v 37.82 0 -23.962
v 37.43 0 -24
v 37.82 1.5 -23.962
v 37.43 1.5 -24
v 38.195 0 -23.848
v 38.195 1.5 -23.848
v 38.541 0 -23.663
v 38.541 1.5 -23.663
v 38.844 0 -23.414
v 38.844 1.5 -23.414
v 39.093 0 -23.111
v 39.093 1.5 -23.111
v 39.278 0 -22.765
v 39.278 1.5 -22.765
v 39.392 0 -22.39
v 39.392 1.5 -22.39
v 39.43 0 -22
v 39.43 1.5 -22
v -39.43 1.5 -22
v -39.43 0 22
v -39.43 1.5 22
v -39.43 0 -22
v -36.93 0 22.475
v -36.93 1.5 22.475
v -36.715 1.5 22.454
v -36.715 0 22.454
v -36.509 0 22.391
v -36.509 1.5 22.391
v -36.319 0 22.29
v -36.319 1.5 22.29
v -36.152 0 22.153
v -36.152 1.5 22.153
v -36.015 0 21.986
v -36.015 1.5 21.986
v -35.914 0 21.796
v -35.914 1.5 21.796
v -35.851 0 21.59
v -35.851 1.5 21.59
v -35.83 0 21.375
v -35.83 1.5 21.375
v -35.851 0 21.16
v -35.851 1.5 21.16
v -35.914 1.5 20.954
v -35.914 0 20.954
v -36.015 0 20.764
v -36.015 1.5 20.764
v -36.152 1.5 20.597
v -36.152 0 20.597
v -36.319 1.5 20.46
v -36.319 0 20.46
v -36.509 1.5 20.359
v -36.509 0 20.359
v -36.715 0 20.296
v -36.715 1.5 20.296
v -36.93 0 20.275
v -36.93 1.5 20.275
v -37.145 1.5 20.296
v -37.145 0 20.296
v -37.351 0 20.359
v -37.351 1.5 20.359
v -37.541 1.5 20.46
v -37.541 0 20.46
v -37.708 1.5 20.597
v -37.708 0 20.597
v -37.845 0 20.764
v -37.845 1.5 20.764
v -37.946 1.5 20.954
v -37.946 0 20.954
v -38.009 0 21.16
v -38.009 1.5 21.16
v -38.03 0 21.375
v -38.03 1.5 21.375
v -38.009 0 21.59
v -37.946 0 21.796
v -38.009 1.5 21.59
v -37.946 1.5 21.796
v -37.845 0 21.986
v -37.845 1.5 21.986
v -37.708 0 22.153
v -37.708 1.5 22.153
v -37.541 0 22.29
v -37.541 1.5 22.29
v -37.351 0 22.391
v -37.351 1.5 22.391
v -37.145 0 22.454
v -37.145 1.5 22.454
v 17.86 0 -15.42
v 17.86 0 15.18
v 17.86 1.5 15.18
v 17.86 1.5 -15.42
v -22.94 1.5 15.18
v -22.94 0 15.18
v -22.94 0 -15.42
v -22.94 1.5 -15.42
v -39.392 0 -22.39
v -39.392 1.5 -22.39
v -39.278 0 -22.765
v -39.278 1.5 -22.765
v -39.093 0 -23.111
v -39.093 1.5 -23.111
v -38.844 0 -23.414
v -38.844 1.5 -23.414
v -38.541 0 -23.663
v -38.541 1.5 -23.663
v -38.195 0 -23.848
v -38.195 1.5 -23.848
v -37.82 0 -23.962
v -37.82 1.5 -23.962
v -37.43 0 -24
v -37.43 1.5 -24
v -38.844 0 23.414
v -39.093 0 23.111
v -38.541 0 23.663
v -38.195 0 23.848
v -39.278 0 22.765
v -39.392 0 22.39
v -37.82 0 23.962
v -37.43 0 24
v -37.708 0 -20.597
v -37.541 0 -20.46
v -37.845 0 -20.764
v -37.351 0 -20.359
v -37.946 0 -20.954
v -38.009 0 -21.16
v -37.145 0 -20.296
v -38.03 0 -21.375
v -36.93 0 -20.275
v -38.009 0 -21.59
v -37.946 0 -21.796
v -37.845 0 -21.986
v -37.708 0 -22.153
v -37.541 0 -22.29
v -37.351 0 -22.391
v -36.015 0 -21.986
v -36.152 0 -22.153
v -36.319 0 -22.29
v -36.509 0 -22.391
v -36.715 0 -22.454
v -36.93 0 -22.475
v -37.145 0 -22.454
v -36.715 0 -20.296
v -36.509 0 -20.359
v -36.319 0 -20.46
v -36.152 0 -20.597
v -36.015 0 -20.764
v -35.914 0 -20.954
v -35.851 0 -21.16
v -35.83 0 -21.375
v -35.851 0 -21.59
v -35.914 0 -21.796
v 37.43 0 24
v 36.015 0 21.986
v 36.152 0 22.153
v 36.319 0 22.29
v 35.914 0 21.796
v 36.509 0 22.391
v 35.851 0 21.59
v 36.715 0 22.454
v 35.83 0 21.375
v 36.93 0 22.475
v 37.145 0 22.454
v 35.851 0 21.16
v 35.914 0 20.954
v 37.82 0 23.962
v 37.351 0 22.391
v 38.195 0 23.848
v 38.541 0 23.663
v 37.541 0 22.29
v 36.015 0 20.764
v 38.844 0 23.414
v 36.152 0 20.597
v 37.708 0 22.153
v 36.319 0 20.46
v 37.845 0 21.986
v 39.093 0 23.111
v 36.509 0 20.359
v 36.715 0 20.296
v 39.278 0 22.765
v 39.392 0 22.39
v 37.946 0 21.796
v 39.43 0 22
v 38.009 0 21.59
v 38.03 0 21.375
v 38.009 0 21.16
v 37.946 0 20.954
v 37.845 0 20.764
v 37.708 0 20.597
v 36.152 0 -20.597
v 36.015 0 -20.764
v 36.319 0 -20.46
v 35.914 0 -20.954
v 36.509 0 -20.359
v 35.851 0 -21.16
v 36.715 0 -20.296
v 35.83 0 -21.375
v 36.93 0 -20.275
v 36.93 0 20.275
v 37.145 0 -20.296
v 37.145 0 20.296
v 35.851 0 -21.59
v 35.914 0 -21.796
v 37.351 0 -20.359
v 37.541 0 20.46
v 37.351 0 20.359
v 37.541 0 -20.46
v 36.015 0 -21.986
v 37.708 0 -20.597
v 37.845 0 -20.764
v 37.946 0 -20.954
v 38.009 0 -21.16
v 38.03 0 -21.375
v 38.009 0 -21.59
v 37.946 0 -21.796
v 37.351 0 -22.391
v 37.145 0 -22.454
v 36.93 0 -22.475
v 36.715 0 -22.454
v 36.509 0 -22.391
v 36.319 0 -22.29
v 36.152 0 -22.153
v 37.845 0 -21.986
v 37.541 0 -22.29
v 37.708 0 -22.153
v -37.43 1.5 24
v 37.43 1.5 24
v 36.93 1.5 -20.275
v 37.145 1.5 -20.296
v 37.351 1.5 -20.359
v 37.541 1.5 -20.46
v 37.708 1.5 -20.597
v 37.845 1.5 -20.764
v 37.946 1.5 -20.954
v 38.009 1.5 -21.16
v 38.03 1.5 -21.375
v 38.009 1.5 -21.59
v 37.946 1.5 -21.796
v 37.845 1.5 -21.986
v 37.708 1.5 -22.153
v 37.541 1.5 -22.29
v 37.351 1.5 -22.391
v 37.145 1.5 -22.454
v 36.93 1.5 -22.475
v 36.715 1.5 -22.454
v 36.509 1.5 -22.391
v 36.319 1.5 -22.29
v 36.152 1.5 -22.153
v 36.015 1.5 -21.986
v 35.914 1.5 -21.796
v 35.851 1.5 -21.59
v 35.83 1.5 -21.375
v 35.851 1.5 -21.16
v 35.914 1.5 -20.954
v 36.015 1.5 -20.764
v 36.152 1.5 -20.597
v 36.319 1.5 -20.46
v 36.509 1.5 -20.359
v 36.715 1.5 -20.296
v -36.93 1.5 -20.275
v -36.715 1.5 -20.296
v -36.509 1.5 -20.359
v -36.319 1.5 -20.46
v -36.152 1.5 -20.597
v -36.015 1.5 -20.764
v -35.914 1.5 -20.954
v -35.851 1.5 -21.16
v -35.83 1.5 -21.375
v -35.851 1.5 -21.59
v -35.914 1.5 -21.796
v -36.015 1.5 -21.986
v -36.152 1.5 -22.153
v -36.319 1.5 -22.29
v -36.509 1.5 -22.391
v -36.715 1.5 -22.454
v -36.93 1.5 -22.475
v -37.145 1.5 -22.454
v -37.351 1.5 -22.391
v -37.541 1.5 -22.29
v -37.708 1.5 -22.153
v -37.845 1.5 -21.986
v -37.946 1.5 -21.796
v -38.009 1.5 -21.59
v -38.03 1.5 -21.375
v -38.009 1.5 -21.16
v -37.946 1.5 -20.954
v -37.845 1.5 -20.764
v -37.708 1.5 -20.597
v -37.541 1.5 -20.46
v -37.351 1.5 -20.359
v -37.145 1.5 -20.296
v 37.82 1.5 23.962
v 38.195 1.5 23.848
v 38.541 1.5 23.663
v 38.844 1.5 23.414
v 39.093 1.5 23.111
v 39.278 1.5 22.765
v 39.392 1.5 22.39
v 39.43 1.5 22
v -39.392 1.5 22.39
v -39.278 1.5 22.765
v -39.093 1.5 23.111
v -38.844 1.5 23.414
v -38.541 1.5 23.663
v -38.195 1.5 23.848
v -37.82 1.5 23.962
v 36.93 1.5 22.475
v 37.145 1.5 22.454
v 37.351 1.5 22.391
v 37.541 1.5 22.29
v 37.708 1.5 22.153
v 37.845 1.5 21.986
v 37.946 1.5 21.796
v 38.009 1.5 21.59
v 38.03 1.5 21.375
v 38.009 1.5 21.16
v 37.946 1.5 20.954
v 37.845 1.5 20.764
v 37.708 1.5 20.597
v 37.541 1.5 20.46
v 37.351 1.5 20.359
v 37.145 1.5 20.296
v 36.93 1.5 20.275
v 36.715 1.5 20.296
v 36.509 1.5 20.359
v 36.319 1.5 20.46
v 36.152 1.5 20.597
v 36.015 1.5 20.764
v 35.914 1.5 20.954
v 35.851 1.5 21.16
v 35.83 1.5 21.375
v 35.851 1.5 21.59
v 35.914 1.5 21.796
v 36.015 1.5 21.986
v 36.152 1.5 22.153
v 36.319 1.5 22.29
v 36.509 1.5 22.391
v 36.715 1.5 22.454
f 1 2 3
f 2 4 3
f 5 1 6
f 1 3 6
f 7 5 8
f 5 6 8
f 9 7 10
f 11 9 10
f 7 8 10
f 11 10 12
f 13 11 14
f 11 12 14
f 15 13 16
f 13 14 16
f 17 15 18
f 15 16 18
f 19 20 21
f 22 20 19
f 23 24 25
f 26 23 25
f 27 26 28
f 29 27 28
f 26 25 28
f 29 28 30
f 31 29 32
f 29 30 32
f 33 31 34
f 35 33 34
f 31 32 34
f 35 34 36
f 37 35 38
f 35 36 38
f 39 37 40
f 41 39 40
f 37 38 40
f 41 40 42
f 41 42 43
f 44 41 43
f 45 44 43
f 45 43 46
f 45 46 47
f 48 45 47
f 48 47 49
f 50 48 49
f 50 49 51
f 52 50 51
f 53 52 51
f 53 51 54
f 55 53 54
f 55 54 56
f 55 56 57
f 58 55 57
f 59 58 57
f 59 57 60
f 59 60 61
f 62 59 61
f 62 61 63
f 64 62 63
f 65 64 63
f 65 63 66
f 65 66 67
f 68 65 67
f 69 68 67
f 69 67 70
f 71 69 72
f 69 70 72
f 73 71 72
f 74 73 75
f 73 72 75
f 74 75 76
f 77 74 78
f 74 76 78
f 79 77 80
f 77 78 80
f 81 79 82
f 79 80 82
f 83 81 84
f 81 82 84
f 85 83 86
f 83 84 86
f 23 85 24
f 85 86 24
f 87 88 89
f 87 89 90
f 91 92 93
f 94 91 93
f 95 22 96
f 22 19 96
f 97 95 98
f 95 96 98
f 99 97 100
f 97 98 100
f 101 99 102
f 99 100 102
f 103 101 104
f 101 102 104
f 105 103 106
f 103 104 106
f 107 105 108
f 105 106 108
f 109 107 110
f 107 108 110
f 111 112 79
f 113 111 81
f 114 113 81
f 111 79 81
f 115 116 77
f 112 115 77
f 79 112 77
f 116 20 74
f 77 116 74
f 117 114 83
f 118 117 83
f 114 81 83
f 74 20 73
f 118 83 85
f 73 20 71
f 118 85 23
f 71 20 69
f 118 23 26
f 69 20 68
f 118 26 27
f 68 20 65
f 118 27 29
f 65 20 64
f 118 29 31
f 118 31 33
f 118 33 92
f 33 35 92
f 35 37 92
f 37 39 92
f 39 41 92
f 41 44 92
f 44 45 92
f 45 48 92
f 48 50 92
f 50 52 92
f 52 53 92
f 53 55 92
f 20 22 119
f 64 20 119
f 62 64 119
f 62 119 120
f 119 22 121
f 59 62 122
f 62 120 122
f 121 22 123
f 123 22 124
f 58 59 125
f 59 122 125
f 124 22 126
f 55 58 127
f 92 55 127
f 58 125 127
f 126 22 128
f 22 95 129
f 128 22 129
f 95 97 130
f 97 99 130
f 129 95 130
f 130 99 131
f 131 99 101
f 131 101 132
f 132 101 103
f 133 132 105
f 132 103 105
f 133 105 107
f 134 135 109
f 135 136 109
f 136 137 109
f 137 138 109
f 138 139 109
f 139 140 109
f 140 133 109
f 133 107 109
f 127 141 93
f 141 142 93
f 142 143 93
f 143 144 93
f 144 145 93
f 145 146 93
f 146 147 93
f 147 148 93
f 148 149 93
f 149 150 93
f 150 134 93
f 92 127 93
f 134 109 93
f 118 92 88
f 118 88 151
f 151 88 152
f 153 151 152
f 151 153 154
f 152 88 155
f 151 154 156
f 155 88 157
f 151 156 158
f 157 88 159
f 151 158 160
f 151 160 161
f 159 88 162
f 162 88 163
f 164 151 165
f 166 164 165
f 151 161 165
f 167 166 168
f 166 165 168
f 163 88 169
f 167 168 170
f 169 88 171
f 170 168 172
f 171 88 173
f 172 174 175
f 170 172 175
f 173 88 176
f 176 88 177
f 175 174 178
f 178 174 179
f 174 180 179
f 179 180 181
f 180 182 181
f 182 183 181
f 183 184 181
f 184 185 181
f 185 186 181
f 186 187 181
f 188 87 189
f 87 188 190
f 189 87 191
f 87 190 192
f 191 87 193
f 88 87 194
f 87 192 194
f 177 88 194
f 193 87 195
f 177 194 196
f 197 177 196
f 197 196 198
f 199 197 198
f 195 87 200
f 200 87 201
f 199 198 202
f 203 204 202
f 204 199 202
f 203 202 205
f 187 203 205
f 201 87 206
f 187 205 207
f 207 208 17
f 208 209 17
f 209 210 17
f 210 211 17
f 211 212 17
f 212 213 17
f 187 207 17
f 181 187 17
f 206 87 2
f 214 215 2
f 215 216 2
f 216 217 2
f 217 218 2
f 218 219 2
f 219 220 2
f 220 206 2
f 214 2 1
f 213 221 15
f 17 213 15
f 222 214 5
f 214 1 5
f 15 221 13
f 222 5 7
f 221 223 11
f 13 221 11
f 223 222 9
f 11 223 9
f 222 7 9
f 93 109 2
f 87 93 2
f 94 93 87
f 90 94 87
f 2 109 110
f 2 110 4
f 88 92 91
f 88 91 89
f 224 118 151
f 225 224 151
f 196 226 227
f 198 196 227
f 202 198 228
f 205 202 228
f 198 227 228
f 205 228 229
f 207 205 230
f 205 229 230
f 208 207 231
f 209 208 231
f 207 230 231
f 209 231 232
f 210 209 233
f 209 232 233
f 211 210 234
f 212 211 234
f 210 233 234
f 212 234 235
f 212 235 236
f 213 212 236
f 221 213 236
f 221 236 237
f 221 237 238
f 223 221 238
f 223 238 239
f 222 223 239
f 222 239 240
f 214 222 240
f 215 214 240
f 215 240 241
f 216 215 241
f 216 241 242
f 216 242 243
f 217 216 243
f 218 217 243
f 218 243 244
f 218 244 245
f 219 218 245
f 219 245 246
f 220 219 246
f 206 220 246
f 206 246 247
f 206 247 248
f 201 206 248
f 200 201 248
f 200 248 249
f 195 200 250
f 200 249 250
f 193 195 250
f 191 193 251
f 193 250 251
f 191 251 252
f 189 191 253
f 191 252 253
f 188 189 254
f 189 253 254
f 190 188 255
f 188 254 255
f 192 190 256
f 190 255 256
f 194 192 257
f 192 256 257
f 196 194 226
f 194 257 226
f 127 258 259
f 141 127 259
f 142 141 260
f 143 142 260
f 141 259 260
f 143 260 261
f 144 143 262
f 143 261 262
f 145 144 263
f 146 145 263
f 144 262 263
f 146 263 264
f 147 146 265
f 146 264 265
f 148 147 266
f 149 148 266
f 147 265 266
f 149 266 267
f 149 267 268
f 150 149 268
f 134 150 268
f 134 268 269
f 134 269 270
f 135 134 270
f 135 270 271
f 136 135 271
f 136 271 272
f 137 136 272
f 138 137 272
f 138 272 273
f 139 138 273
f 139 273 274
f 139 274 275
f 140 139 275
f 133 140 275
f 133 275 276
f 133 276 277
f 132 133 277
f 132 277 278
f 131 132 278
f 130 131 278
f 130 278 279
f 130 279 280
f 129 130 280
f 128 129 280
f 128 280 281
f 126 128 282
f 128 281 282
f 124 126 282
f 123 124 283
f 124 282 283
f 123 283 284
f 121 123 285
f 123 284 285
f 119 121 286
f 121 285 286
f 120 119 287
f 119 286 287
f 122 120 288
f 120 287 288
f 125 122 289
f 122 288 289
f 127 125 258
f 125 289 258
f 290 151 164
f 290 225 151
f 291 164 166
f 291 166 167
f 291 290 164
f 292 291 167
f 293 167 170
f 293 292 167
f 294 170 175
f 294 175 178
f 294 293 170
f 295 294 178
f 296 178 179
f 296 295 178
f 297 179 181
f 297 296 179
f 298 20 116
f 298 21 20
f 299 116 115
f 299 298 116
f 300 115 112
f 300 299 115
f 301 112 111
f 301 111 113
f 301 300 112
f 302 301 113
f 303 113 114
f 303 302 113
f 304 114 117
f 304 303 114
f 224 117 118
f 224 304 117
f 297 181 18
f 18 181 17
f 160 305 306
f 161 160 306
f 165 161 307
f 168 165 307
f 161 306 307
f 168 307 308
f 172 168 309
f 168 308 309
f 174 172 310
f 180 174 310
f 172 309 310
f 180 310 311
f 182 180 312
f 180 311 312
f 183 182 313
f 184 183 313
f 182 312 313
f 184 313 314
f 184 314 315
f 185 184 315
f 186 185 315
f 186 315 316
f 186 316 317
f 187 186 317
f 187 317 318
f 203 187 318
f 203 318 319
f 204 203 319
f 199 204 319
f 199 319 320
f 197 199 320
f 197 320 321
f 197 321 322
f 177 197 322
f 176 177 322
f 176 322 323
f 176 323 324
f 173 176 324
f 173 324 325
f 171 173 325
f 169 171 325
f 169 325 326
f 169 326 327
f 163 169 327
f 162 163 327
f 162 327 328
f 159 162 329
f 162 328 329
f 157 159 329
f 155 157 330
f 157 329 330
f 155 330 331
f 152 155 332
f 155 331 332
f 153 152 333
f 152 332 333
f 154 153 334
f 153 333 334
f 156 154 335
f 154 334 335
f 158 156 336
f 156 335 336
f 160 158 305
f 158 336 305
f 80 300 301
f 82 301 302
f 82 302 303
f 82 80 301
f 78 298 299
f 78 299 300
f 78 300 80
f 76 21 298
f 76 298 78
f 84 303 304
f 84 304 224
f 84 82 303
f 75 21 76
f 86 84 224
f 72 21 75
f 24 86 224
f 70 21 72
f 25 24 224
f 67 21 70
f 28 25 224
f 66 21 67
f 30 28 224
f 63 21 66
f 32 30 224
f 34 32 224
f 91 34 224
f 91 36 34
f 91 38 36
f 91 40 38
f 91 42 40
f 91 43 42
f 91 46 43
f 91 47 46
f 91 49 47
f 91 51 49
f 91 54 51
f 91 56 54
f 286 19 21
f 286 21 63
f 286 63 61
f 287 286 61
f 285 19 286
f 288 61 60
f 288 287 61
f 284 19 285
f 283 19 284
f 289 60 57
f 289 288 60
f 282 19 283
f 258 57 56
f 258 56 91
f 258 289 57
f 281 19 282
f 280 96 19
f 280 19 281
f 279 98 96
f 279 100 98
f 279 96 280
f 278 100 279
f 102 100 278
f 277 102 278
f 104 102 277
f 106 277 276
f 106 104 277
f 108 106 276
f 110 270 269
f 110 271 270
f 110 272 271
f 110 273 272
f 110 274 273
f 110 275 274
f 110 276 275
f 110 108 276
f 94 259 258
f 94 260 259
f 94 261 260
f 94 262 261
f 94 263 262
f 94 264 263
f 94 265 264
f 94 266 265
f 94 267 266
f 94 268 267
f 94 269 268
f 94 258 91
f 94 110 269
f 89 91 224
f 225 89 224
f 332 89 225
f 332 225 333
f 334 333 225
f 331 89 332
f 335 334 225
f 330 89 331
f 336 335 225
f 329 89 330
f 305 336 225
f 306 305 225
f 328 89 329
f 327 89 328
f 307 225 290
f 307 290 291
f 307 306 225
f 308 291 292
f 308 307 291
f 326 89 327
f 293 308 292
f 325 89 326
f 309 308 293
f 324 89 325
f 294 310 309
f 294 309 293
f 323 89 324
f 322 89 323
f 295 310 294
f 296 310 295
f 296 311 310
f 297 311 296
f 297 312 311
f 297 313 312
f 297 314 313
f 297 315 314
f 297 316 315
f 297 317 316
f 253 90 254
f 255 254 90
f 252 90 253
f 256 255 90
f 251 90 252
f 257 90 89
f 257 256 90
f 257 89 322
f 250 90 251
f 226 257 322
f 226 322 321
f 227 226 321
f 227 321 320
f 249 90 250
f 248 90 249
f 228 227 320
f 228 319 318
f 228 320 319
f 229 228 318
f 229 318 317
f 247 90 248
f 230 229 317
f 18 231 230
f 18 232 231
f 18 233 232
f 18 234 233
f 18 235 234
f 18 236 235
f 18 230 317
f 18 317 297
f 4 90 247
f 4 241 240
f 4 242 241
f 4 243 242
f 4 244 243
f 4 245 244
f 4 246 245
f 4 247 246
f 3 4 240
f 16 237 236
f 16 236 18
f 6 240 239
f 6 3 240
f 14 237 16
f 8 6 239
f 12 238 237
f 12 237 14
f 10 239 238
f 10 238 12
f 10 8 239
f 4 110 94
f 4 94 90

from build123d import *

# Parameters (mm, degrees)
SKETCH1_W           = 78.86
SKETCH1_H           = 48
SKETCH1_W_2         = 40.8
SKETCH1_H_2         = 30.6
BOSS_EXTRUDE1_DEPTH = 1.5
CUT_EXTRUDE1_REACH  = 48.184
SKETCH2_R           = 1.1
FILLET1_R           = 2


with BuildPart() as part:
    # Sketch1 → Boss-Extrude1 (new body)
    with BuildSketch(Plane(origin=(0, 0, 0), x_dir=(1, 0, 0), z_dir=(0, 1, 0))):
        Rectangle(SKETCH1_W, SKETCH1_H)
        with Locations((-2.54, 0.12)):
            Rectangle(SKETCH1_W_2, SKETCH1_H_2, mode=Mode.SUBTRACT)
    extrude(amount=BOSS_EXTRUDE1_DEPTH)

    # Sketch2 → Cut-Extrude1 (cut, up to next)
    with BuildSketch(Plane(origin=(0, 1.5, 0), x_dir=(1, 0, 0), z_dir=(0, 1, 0)), mode=Mode.PRIVATE) as cut_extrude1_sk1:
        with Locations(Location((-36.93, 21.375, 0), (0, 0, 270))):
            Circle(SKETCH2_R)
    cut_extrude1_tool1 = extrude(cut_extrude1_sk1.sketch, amount=-CUT_EXTRUDE1_REACH, mode=Mode.PRIVATE) & part.part
    # Sketch2 → Cut-Extrude1 (cut, up to next)
    with BuildSketch(Plane(origin=(0, 1.5, 0), x_dir=(1, 0, 0), z_dir=(0, 1, 0)), mode=Mode.PRIVATE) as cut_extrude1_sk2:
        with Locations(Location((-36.93, -21.375, 0), (0, 0, 270))):
            Circle(SKETCH2_R)
    cut_extrude1_tool2 = extrude(cut_extrude1_sk2.sketch, amount=-CUT_EXTRUDE1_REACH, mode=Mode.PRIVATE) & part.part
    # Sketch2 → Cut-Extrude1 (cut, up to next)
    with BuildSketch(Plane(origin=(0, 1.5, 0), x_dir=(1, 0, 0), z_dir=(0, 1, 0)), mode=Mode.PRIVATE) as cut_extrude1_sk3:
        with Locations(Location((36.93, 21.375, 0), (0, 0, 270))):
            Circle(SKETCH2_R)
    cut_extrude1_tool3 = extrude(cut_extrude1_sk3.sketch, amount=-CUT_EXTRUDE1_REACH, mode=Mode.PRIVATE) & part.part
    # Sketch2 → Cut-Extrude1 (cut, up to next)
    with BuildSketch(Plane(origin=(0, 1.5, 0), x_dir=(1, 0, 0), z_dir=(0, 1, 0)), mode=Mode.PRIVATE) as cut_extrude1_sk4:
        with Locations(Location((36.93, -21.375, 0), (0, 0, 270))):
            Circle(SKETCH2_R)
    cut_extrude1_tool4 = extrude(cut_extrude1_sk4.sketch, amount=-CUT_EXTRUDE1_REACH, mode=Mode.PRIVATE) & part.part
    add(cut_extrude1_tool1.solids().sort_by_distance((-36.93, 1.5, -21.375))[0], mode=Mode.SUBTRACT)
    add(cut_extrude1_tool2.solids().sort_by_distance((-36.93, 1.5, 21.375))[0], mode=Mode.SUBTRACT)
    add(cut_extrude1_tool3.solids().sort_by_distance((36.93, 1.5, -21.375))[0], mode=Mode.SUBTRACT)
    add(cut_extrude1_tool4.solids().sort_by_distance((36.93, 1.5, 21.375))[0], mode=Mode.SUBTRACT)

    # Fillet1
    fillet1_edges = [part.edges().sort_by_distance(p)[0] for p in [
        (-39.43, 0.75, -24),
        (39.43, 0.75, -24),
        (39.43, 0.75, 24),
        (-39.43, 0.75, 24),
    ]]
    fillet(fillet1_edges, radius=FILLET1_R)


solid = part.part
